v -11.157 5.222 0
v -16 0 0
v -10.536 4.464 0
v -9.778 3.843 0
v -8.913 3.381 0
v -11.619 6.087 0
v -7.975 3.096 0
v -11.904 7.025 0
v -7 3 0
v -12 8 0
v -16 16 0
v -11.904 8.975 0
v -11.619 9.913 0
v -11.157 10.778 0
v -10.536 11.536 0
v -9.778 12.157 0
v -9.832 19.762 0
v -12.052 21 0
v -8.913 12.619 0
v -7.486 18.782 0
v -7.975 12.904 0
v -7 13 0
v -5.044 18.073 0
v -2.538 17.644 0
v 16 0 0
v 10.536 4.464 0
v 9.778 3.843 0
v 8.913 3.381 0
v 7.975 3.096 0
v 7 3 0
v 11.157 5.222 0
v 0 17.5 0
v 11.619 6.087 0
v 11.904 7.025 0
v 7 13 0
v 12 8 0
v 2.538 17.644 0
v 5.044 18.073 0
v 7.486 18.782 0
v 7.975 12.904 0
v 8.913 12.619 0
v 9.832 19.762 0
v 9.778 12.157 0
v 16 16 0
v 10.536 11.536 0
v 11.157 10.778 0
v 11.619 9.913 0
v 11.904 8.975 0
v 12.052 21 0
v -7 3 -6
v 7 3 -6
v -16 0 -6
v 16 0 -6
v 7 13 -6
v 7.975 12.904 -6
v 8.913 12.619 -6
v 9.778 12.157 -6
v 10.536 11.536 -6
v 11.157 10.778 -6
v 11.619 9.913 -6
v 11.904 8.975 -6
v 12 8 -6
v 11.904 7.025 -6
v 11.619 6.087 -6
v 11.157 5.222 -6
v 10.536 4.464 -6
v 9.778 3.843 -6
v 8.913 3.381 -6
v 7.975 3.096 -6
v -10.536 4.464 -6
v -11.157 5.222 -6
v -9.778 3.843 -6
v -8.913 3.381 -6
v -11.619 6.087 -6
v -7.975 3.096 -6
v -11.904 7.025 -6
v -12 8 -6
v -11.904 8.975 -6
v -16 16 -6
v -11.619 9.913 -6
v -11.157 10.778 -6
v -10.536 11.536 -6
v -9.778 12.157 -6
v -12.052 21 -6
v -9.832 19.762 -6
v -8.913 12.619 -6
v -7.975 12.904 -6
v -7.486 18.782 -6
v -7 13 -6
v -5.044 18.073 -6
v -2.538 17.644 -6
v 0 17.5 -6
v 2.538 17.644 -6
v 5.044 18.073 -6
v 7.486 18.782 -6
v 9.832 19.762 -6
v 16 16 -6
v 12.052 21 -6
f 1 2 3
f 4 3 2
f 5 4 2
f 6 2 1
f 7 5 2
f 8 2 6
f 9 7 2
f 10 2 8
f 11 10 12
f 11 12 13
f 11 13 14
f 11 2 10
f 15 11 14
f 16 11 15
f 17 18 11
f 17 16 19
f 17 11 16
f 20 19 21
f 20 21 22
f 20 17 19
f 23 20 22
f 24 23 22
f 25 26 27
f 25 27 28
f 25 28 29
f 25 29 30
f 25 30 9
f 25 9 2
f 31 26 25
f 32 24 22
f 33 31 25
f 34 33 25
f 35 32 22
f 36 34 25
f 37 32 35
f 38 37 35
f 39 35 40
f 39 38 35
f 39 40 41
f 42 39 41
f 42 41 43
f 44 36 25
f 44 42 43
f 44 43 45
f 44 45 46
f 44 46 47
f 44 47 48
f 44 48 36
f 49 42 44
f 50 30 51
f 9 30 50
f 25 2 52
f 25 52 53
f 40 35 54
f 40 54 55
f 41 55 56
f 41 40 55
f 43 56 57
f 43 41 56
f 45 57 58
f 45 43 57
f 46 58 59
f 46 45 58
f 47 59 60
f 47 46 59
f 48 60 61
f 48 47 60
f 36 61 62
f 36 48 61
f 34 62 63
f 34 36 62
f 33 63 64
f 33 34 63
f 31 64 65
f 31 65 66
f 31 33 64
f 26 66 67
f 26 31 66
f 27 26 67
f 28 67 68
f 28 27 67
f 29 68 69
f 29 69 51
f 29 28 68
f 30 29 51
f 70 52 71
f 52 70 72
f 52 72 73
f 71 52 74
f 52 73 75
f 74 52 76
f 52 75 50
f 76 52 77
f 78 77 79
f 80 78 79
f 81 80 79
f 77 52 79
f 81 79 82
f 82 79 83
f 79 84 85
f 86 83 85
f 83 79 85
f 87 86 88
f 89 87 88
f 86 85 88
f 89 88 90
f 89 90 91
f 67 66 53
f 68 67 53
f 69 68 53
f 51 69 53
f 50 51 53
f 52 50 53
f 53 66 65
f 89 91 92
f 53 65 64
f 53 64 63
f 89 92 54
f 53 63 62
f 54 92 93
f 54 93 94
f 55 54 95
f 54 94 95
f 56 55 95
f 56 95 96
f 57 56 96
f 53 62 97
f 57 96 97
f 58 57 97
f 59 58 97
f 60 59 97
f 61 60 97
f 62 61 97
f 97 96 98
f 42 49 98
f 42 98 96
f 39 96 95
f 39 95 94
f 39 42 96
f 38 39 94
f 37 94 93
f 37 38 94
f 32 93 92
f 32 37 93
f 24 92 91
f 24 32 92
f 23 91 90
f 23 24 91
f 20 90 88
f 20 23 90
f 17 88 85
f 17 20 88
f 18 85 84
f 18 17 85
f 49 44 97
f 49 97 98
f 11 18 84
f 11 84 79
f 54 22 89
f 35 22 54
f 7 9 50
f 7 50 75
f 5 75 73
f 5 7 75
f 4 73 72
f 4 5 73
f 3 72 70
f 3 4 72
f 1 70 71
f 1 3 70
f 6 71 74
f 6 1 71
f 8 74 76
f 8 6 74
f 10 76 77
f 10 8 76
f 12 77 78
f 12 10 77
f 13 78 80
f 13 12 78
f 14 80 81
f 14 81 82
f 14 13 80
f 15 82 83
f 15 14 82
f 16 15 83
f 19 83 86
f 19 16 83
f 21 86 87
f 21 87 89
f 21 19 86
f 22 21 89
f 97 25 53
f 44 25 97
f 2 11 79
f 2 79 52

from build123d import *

# Parameters (mm, degrees)
BOSS_EXTRU_2_DEPTH = 6


with BuildPart() as part:
    # Esquisse1 → Boss.-Extru.2 (new body)
    with BuildSketch(Plane.XY):
        with BuildLine():
            Line((-16, 0), (16, 0))
            Line((16, 0), (16, 16))
            Line((16, 16), (12.051970793, 21))
            ThreePointArc((12.051970793, 21), (0, 17.5), (-12.051970793, 21))
            Line((-12.051970793, 21), (-16, 16))
            Line((-16, 16), (-16, 0))
        make_face()
        with BuildLine():
            Line((-7, 13), (7, 13))
            ThreePointArc((7, 13), (12, 8), (7, 3))
            Line((7, 3), (-7, 3))
            ThreePointArc((-7, 3), (-12, 8), (-7, 13))
        make_face(mode=Mode.SUBTRACT)
    extrude(amount=-BOSS_EXTRU_2_DEPTH)


solid = part.part
